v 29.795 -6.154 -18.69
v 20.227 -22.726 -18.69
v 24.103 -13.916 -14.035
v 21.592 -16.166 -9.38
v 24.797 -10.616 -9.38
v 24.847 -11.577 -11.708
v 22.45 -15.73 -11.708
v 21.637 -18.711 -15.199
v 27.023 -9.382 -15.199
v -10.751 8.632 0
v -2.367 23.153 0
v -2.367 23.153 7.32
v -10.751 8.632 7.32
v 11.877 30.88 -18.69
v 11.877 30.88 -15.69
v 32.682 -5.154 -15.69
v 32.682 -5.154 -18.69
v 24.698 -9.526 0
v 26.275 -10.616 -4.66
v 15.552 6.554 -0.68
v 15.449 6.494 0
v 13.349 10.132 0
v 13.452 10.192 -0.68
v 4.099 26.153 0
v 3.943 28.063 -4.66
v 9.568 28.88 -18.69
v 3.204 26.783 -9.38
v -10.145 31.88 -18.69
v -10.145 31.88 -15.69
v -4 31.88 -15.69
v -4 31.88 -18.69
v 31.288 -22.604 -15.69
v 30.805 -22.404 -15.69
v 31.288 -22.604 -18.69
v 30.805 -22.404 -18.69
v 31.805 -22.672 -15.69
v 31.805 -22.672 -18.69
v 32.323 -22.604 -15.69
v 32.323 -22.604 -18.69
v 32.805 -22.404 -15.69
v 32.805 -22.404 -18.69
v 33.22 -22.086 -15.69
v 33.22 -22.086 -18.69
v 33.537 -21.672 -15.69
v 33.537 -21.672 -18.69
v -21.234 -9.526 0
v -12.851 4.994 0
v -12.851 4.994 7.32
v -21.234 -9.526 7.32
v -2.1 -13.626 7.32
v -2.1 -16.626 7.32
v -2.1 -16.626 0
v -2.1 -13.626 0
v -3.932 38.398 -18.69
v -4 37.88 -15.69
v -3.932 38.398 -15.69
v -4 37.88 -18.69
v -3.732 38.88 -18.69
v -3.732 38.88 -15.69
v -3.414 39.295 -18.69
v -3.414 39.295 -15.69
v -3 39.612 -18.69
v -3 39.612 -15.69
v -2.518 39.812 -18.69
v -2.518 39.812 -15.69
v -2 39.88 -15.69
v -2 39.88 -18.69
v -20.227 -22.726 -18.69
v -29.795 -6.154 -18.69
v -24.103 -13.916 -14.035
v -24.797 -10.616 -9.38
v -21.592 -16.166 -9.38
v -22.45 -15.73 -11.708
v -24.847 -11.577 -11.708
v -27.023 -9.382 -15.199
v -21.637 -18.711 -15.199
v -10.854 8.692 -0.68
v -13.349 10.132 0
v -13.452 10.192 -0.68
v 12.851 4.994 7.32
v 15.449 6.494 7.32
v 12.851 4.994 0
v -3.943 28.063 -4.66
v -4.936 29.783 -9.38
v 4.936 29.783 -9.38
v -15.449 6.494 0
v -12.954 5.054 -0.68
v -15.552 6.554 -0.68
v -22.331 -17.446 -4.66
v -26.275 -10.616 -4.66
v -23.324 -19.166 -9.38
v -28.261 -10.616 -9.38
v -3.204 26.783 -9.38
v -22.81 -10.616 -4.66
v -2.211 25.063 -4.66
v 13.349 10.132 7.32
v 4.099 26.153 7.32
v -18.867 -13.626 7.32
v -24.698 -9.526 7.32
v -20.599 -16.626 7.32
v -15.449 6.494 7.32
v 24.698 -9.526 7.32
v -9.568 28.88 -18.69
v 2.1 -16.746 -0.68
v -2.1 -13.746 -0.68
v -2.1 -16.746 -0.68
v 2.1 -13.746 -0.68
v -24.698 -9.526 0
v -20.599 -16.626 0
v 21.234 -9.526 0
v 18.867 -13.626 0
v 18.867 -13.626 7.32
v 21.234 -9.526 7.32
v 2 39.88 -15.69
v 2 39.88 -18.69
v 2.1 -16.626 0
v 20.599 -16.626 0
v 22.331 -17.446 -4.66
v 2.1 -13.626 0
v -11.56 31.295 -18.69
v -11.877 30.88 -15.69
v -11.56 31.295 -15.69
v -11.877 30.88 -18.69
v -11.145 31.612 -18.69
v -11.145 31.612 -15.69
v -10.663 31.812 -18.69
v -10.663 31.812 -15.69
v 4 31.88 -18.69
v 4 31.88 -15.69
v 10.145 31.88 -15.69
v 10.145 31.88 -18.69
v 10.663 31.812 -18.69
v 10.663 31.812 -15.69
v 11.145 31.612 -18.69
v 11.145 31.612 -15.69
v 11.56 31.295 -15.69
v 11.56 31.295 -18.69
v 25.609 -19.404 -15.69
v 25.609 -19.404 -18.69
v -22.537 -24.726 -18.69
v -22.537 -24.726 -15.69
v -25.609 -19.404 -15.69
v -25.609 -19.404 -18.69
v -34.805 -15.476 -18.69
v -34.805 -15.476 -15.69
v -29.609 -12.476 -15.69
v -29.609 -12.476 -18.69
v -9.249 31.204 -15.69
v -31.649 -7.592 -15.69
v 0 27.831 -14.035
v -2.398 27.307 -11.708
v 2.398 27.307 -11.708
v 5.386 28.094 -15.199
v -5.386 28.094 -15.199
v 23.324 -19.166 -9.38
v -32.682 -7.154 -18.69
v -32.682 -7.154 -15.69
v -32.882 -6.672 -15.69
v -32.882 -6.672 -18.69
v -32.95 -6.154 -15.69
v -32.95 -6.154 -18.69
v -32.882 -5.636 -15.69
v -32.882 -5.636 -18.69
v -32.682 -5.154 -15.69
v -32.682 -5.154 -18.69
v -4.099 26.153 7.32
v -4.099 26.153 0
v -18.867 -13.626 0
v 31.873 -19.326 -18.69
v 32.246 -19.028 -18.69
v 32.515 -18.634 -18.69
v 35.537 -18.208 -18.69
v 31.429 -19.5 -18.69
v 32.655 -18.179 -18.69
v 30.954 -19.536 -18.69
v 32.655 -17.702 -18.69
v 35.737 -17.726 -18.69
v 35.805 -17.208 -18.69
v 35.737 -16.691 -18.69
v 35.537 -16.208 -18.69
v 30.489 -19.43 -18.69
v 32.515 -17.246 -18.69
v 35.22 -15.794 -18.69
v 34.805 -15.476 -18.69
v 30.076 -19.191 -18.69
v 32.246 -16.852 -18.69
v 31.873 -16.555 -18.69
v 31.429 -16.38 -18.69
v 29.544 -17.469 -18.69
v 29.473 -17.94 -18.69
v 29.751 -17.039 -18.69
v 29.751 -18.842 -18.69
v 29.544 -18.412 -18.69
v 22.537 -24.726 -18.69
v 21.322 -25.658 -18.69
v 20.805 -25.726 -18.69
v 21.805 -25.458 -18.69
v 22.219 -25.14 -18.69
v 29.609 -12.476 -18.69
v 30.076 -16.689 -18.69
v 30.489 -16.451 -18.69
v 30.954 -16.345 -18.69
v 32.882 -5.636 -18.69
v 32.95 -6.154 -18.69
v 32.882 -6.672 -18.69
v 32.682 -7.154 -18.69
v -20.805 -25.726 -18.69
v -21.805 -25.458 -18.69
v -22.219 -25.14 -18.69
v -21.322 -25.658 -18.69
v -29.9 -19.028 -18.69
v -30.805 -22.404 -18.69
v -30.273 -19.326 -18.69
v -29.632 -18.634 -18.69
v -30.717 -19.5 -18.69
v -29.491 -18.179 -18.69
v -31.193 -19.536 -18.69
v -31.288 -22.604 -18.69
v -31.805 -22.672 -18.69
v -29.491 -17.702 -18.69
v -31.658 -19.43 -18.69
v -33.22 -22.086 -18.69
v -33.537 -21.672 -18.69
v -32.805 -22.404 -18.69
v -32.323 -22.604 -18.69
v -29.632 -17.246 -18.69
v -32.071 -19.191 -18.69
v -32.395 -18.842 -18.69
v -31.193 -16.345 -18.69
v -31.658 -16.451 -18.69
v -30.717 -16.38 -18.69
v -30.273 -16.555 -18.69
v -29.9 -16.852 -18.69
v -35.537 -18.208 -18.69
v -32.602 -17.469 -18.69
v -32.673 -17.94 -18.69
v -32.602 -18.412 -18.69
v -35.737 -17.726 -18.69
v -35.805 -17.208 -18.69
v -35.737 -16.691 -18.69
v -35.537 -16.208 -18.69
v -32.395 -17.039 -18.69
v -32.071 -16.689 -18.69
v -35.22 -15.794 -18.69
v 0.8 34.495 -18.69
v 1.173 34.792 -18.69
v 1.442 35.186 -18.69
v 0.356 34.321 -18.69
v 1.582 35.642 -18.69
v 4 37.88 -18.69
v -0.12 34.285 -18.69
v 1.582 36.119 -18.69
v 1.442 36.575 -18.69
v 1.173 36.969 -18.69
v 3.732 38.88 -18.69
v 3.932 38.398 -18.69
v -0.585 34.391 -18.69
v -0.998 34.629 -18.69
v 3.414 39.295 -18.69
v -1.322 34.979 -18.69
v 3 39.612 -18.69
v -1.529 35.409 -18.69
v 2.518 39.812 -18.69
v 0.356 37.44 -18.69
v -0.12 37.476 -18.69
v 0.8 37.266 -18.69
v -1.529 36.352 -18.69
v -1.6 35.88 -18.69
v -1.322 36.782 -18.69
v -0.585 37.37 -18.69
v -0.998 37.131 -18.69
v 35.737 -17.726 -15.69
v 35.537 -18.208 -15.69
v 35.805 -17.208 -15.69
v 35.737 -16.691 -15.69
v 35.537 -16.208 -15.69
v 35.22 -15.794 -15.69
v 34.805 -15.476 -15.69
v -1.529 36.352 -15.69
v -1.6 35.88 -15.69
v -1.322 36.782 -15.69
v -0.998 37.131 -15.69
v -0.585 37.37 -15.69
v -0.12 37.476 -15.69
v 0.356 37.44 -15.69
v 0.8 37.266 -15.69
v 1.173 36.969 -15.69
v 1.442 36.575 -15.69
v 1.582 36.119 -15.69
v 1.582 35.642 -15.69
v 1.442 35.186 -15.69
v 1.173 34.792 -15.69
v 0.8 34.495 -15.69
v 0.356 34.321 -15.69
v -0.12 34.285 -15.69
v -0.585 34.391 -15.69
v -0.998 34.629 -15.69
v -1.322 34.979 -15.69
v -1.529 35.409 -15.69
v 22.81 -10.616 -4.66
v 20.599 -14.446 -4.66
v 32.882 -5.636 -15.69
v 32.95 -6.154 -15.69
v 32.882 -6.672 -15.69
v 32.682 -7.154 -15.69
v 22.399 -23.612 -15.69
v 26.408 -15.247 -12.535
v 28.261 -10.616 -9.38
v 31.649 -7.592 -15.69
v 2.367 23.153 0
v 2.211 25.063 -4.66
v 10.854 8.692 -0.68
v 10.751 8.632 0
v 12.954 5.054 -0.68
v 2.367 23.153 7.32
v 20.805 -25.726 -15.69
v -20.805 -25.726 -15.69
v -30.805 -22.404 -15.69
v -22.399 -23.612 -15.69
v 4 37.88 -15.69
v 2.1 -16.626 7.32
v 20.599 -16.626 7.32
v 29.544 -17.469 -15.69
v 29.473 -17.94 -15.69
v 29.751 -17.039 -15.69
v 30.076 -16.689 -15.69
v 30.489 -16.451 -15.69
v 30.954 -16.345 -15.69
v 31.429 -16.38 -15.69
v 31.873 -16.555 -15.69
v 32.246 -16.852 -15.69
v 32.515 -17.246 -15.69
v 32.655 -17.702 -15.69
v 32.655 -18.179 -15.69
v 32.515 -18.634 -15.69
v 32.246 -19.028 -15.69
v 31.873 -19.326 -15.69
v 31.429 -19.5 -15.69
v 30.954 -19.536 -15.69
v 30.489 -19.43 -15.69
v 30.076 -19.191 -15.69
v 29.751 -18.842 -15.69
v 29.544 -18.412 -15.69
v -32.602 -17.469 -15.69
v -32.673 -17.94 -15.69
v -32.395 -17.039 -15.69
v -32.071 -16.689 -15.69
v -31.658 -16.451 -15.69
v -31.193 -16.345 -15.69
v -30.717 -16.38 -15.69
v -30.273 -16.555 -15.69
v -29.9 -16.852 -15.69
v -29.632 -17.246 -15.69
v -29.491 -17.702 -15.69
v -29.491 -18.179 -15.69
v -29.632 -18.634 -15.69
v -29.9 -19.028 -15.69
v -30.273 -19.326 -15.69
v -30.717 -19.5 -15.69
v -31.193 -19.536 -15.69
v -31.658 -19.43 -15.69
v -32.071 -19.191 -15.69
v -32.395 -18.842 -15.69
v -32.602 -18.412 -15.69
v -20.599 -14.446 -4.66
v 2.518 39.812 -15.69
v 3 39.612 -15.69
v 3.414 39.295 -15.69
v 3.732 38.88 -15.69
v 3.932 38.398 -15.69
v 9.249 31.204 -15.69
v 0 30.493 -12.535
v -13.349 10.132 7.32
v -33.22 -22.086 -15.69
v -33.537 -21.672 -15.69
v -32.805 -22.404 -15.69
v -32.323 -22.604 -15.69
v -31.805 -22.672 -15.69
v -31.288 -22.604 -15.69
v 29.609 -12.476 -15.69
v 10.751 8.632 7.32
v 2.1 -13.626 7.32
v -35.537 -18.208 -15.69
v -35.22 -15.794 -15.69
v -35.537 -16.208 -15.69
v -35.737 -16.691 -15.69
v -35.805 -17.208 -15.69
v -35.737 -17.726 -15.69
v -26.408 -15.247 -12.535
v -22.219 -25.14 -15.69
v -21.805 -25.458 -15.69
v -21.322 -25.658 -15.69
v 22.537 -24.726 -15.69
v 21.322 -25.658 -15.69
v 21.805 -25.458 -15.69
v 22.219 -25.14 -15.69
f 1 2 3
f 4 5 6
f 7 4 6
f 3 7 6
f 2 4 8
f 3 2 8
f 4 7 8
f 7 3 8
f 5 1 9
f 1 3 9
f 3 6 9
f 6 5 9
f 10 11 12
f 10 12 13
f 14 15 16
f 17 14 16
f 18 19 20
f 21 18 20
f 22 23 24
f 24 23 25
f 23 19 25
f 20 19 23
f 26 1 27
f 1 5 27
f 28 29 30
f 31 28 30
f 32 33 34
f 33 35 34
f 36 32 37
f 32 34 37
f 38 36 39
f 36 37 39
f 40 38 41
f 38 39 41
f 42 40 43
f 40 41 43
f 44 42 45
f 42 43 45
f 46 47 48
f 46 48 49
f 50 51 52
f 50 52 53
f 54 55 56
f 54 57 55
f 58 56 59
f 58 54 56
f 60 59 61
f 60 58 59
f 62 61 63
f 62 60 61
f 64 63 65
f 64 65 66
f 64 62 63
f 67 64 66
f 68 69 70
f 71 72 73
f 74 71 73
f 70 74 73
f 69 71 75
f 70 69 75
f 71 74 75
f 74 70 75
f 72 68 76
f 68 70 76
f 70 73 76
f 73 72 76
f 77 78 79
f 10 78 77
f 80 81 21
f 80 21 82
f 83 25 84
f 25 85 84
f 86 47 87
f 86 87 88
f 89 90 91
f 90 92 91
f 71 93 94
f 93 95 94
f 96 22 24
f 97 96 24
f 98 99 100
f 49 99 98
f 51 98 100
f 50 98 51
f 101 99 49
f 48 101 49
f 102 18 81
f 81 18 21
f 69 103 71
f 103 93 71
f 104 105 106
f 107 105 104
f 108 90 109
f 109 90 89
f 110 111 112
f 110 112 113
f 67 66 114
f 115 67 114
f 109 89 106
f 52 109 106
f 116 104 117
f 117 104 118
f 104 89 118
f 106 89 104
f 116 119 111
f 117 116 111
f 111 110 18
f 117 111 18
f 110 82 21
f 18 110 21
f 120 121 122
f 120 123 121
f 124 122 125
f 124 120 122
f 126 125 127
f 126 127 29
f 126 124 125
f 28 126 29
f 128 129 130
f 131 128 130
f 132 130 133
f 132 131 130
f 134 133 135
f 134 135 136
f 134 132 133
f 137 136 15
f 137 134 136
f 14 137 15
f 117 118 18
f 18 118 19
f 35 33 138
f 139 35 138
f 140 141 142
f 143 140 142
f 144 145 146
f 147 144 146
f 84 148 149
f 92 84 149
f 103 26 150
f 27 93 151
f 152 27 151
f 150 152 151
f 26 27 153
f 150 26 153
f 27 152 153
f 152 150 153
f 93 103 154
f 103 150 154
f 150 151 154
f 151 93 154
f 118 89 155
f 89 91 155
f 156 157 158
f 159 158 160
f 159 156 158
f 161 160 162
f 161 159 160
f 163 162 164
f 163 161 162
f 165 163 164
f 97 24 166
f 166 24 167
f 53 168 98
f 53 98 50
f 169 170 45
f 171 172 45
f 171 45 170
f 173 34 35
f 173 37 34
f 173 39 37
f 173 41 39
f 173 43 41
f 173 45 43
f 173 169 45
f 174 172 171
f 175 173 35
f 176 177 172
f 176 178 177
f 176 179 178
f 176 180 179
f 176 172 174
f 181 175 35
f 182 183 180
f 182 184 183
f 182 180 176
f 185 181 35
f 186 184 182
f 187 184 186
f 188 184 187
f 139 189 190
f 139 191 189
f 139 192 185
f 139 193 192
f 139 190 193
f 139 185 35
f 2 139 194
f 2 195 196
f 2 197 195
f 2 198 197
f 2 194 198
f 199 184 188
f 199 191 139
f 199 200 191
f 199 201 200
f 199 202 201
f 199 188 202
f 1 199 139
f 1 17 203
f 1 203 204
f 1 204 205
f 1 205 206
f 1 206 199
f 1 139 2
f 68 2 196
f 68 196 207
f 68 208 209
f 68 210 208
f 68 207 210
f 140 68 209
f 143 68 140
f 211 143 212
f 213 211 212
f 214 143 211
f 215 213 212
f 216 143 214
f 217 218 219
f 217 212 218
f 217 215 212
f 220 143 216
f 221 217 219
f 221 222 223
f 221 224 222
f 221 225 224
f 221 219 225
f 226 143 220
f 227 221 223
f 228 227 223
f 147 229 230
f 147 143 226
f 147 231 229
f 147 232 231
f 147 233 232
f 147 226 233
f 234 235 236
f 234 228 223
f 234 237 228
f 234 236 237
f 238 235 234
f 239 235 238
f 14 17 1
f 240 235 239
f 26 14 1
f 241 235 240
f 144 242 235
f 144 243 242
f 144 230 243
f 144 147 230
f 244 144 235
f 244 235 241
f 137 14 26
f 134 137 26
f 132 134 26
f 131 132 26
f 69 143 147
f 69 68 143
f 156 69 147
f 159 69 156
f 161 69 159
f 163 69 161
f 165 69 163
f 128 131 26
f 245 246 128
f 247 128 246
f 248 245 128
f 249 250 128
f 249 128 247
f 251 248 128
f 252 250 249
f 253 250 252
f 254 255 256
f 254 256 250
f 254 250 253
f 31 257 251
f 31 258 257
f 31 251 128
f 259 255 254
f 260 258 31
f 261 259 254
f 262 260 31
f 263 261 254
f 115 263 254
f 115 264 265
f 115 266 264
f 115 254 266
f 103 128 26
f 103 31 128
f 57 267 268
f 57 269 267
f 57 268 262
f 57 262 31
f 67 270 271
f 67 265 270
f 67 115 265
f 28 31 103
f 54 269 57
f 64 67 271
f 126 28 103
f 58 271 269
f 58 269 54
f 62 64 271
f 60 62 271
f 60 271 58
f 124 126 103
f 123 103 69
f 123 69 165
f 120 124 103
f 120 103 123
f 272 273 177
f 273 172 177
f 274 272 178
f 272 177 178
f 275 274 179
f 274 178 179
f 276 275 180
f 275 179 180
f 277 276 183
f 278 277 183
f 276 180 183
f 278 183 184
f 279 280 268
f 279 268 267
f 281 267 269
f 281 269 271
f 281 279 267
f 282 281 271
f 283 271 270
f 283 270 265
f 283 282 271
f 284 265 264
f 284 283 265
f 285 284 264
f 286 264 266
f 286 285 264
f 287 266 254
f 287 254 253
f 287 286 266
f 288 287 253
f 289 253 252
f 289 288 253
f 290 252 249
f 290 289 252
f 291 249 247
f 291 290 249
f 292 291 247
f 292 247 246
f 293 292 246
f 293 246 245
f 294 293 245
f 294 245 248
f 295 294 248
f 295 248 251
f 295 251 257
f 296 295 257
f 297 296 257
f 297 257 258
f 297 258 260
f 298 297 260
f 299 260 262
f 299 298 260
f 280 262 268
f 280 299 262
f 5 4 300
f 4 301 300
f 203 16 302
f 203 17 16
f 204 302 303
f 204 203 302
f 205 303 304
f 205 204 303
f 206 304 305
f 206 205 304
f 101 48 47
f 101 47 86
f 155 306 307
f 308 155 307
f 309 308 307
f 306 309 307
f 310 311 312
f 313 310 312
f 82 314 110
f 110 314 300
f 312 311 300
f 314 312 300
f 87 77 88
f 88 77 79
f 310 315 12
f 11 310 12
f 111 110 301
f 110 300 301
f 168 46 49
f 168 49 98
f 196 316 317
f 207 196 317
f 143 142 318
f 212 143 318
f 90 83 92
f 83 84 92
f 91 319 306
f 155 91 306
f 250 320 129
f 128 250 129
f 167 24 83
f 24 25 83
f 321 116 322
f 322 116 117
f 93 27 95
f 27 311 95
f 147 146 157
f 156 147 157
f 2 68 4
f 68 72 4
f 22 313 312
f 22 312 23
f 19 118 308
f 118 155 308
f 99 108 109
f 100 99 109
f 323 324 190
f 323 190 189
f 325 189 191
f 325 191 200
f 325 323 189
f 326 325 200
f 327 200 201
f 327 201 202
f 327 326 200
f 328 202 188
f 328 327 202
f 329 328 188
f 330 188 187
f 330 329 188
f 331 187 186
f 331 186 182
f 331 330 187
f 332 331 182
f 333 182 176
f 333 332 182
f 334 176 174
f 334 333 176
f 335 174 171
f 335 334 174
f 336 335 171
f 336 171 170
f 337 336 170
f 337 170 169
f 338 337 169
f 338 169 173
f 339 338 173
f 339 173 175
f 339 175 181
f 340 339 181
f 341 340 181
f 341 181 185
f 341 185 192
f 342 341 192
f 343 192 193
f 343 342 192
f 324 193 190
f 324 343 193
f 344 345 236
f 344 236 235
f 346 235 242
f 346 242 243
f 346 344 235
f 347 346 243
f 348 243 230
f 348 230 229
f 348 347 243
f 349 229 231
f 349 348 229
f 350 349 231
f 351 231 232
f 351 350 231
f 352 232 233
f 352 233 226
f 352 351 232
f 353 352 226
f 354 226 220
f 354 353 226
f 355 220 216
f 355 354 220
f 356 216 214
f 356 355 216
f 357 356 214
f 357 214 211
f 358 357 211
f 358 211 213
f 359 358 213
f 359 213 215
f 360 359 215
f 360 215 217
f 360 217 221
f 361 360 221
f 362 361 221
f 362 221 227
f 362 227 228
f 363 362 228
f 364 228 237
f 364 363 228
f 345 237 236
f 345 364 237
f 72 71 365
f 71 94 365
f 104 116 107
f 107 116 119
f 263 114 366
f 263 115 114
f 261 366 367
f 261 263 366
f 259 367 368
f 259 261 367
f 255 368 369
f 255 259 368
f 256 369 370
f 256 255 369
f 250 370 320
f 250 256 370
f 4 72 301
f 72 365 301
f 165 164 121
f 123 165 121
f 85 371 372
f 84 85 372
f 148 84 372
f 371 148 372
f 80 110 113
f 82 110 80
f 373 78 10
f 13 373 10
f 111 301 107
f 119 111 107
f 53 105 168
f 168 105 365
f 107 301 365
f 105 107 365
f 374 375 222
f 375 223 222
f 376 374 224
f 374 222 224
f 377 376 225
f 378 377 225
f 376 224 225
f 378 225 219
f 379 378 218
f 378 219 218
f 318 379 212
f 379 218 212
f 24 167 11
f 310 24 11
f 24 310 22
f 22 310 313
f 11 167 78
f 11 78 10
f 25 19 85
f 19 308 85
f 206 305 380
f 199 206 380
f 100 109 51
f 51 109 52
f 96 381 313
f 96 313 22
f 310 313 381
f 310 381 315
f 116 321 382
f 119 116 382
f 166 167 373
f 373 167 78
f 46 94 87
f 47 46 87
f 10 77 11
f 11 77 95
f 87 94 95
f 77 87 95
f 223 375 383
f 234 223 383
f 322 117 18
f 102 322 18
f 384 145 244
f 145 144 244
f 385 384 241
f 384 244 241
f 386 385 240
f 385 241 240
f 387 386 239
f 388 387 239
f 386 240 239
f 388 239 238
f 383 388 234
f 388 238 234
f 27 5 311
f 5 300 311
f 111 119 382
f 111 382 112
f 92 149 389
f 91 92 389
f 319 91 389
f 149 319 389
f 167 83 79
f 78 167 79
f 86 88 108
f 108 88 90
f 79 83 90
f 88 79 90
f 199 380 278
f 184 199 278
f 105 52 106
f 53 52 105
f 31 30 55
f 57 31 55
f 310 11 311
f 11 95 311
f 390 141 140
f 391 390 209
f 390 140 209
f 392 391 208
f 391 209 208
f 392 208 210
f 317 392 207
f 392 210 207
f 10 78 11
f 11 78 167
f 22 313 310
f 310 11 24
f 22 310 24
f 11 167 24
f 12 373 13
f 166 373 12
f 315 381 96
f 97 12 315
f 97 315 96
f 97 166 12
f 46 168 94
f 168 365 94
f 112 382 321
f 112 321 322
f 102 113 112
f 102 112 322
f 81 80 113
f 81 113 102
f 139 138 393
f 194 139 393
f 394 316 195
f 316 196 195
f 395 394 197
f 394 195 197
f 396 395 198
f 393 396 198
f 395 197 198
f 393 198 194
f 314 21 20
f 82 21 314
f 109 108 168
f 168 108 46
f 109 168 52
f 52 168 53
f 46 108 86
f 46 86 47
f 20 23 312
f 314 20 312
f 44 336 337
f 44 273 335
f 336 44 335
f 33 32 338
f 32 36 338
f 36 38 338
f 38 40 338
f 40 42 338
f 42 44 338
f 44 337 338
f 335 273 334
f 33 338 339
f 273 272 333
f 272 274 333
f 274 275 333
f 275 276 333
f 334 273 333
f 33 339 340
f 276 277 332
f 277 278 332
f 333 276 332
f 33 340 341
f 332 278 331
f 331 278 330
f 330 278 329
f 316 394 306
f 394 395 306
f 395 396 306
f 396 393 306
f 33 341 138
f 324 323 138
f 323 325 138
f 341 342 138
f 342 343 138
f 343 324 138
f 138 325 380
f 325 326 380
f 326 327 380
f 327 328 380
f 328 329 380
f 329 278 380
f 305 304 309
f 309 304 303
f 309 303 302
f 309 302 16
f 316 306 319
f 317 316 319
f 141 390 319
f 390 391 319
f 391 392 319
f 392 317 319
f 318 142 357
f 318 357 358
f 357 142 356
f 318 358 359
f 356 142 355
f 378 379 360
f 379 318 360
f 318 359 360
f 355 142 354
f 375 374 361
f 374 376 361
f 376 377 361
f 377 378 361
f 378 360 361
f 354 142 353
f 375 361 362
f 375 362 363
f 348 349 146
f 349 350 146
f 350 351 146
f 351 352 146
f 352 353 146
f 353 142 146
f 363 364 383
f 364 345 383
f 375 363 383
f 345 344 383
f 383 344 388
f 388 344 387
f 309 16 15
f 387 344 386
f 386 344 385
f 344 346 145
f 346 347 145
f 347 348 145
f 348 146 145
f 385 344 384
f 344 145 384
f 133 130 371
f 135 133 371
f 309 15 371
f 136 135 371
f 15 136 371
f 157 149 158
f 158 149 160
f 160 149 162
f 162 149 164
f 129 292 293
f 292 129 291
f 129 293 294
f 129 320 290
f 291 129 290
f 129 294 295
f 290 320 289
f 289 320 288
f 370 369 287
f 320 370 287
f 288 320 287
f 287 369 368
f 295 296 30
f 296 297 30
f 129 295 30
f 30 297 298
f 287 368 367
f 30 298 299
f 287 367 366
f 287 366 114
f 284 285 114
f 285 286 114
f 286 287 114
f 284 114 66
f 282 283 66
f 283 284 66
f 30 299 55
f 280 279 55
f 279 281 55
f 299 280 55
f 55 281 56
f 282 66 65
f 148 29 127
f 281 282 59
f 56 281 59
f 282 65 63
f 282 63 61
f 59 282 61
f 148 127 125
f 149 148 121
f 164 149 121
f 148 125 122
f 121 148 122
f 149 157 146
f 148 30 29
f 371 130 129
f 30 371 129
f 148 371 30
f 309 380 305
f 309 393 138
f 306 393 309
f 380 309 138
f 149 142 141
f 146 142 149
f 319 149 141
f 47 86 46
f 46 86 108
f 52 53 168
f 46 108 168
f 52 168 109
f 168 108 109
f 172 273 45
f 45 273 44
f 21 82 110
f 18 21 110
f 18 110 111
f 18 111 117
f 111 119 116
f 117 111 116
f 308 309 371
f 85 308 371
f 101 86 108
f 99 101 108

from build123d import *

# Parameters (mm, degrees)
BOSS_EXTRUDE1_DEPTH     = 7.32
BOSS_EXTRUDE6_START     = -3
BOSS_EXTRUDE6_OUTLINE_R = 1.6
BOSS_EXTRUDE6_DEPTH     = 3
FILLET2_R               = 2
SKETCH16_W              = 4.2
SKETCH16_H              = 15
CUT_EXTRUDE1_DEPTH      = 8


# Read off the part's stored shape, not the designer's step: Boss-Extrude6
with BuildPart() as part:
    # Sketch1 → Boss-Extrude1 (new body)
    with BuildSketch(Plane.XY):
        Polygon((-20.599186911, -16.626279442), (20.599186911, -16.626279442), (24.698373822, -9.526279442), (4.099186911, 26.152558883), (-4.099186911, 26.152558883), (-24.698373822, -9.526279442), align=None)
        Polygon((18.867136104, -13.626279442), (21.234272207, -9.526279442), (2.367136104, 23.152558883), (-2.367136104, 23.152558883), (-21.234272207, -9.526279442), (-18.867136104, -13.626279442), align=None, mode=Mode.SUBTRACT)
    extrude(amount=BOSS_EXTRUDE1_DEPTH)


with BuildPart() as body_2:
    # Sketch1<14> → Loft3 section 0
    with BuildSketch(Plane.XY):
        with BuildLine():
            Line((-4.099186911, 26.152558883), (-24.698373822, -9.526279442))
            Line((-24.698373822, -9.526279442), (-20.599186911, -16.626279442))
            Line((-20.599186911, -16.626279442), (20.599186911, -16.626279442))
            Line((20.599186911, -16.626279442), (24.698373822, -9.526279442))
            Line((24.698373822, -9.526279442), (4.099186911, 26.152558883))
            Line((4.099186911, 26.152558883), (-4.099186911, 26.152558883))
        make_face()
    # Sketch5 → Loft3 section 1
    with BuildSketch(Plane.XY.offset(-4.66)):
        with BuildLine():
            Line((-3.943302339, 28.062558883), (-26.274540057, -10.616279442))
            Line((-26.274540057, -10.616279442), (-22.331237719, -17.446279442))
            Line((-22.331237719, -17.446279442), (22.331237719, -17.446279442))
            Line((22.331237719, -17.446279442), (26.274540057, -10.616279442))
            Line((26.274540057, -10.616279442), (3.943302339, 28.062558883))
            Line((3.943302339, 28.062558883), (-3.943302339, 28.062558883))
        make_face()
    loft()

    # Sketch5<46> → Loft4 section 0
    with BuildSketch(Plane.XY.offset(-4.66)):
        with BuildLine():
            Line((-3.943302339, 28.062558883), (-26.274540057, -10.616279442))
            Line((-26.274540057, -10.616279442), (-22.331237719, -17.446279442))
            Line((-22.331237719, -17.446279442), (22.331237719, -17.446279442))
            Line((22.331237719, -17.446279442), (26.274540057, -10.616279442))
            Line((26.274540057, -10.616279442), (3.943302339, 28.062558883))
            Line((3.943302339, 28.062558883), (-3.943302339, 28.062558883))
        make_face()
    # Sketch13 → Loft4 section 1
    with BuildSketch(Plane.XY.offset(-9.38)):
        with BuildLine():
            Line((-4.936344802, 29.782558883), (-28.260624983, -10.616279442))
            Line((-28.260624983, -10.616279442), (-23.324280182, -19.166279442))
            Line((-23.324280182, -19.166279442), (23.324280182, -19.166279442))
            Line((23.324280182, -19.166279442), (28.260624983, -10.616279442))
            Line((28.260624983, -10.616279442), (4.936344802, 29.782558883))
            Line((4.936344802, 29.782558883), (-4.936344802, 29.782558883))
        make_face()
    loft()

    # Sketch13<4> → Loft5 section 0
    with BuildSketch(Plane.XY.offset(-9.38)):
        with BuildLine():
            Line((-4.936344802, 29.782558883), (-28.260624983, -10.616279442))
            Line((-28.260624983, -10.616279442), (-23.324280182, -19.166279442))
            Line((-23.324280182, -19.166279442), (23.324280182, -19.166279442))
            Line((23.324280182, -19.166279442), (28.260624983, -10.616279442))
            Line((28.260624983, -10.616279442), (4.936344802, 29.782558883))
            Line((4.936344802, 29.782558883), (-4.936344802, 29.782558883))
        make_face()
    # Sketch14 → Loft5 section 1
    with BuildSketch(Plane.XY.offset(-18.69)):
        with BuildLine():
            Line((11.3, 31.880384758), (-11.3, 31.880384758))
            Line((-11.3, 31.880384758), (-33.259223083, -6.154105316))
            Line((-33.259223083, -6.154105316), (-21.959223083, -25.726279442))
            Line((-21.959223083, -25.726279442), (21.959223083, -25.726279442))
            Line((21.959223083, -25.726279442), (33.259223083, -6.154105316))
            Line((33.259223083, -6.154105316), (11.3, 31.880384758))
        make_face()
    loft()

    # Sketch1<15> → Cut-Loft1 section 0
    with BuildSketch(Plane.XY):
        with BuildLine():
            Line((-2.367136104, 23.152558883), (2.367136104, 23.152558883))
            Line((2.367136104, 23.152558883), (21.234272207, -9.526279442))
            Line((21.234272207, -9.526279442), (18.867136104, -13.626279442))
            Line((18.867136104, -13.626279442), (-18.867136104, -13.626279442))
            Line((-18.867136104, -13.626279442), (-21.234272207, -9.526279442))
            Line((-21.234272207, -9.526279442), (-2.367136104, 23.152558883))
        make_face()
    # Sketch5<47> → Cut-Loft1 section 1
    with BuildSketch(Plane.XY.offset(-4.66)):
        with BuildLine():
            Line((2.211251531, 25.062558883), (22.810438442, -10.616279442))
            Line((22.810438442, -10.616279442), (20.599186911, -14.446279442))
            Line((20.599186911, -14.446279442), (-20.599186911, -14.446279442))
            Line((-20.599186911, -14.446279442), (-22.810438442, -10.616279442))
            Line((-22.810438442, -10.616279442), (-2.211251531, 25.062558883))
            Line((-2.211251531, 25.062558883), (2.211251531, 25.062558883))
        make_face()
    loft(mode=Mode.SUBTRACT)

    # Sketch14<5> → Cut-Loft2 section 0
    with BuildSketch(Plane.XY.offset(-18.69)):
        with BuildLine():
            Line((29.795121467, -6.154105316), (9.567949192, 28.880384758))
            Line((9.567949192, 28.880384758), (-9.567949192, 28.880384758))
            Line((-9.567949192, 28.880384758), (-29.795121467, -6.154105316))
            Line((-29.795121467, -6.154105316), (-20.227172275, -22.726279442))
            Line((-20.227172275, -22.726279442), (20.227172275, -22.726279442))
            Line((20.227172275, -22.726279442), (29.795121467, -6.154105316))
        make_face()
    # Sketch13<5> → Cut-Loft2 section 1
    with BuildSketch(Plane.XY.offset(-9.38)):
        with BuildLine():
            Line((-24.796523368, -10.616279442), (-21.592229374, -16.166279442))
            Line((-21.592229374, -16.166279442), (21.592229374, -16.166279442))
            Line((21.592229374, -16.166279442), (24.796523368, -10.616279442))
            Line((24.796523368, -10.616279442), (3.204293994, 26.782558883))
            Line((3.204293994, 26.782558883), (-3.204293994, 26.782558883))
            Line((-3.204293994, 26.782558883), (-24.796523368, -10.616279442))
        make_face()
    loft(mode=Mode.SUBTRACT)

    # Sketch13<6> → Cut-Loft3 section 0
    with BuildSketch(Plane.XY.offset(-9.38)):
        with BuildLine():
            Line((-24.796523368, -10.616279442), (-21.592229374, -16.166279442))
            Line((-21.592229374, -16.166279442), (21.592229374, -16.166279442))
            Line((21.592229374, -16.166279442), (24.796523368, -10.616279442))
            Line((24.796523368, -10.616279442), (3.204293994, 26.782558883))
            Line((3.204293994, 26.782558883), (-3.204293994, 26.782558883))
            Line((-3.204293994, 26.782558883), (-24.796523368, -10.616279442))
        make_face()
    # Sketch5<48> → Cut-Loft3 section 1
    with BuildSketch(Plane.XY.offset(-4.66)):
        with BuildLine():
            Line((2.211251531, 25.062558883), (22.810438442, -10.616279442))
            Line((22.810438442, -10.616279442), (20.599186911, -14.446279442))
            Line((20.599186911, -14.446279442), (-20.599186911, -14.446279442))
            Line((-20.599186911, -14.446279442), (-22.810438442, -10.616279442))
            Line((-22.810438442, -10.616279442), (-2.211251531, 25.062558883))
            Line((-2.211251531, 25.062558883), (2.211251531, 25.062558883))
        make_face()
    loft(mode=Mode.SUBTRACT)

    # Boss-Extrude6 outline → Boss-Extrude6 (add)
    with BuildSketch(Plane(origin=(0, 0, -18.69), x_dir=(-1, 0, 0), z_dir=(0, 0, -1)).offset(BOSS_EXTRUDE6_START)):
        Polygon((36.537426313, -16.476090764), (29.609223083, -12.476090764), (33.259223083, -6.154105316), (11.3, 31.880384758), (4, 31.880384758), (4, 39.880384758), (-4, 39.880384758), (-4, 31.880384758), (-11.3, 31.880384758), (-33.259223083, -6.154105316), (-29.609223083, -12.476090764), (-36.537426313, -16.476090764), (-32.537426313, -23.404293994), (-25.609223083, -19.404293994), (-21.959223083, -25.726279442), (21.959223083, -25.726279442), (25.609223083, -19.404293994), (32.537426313, -23.404293994), align=None)
        with Locations((31.073324698, -17.940192379)):
            Circle(BOSS_EXTRUDE6_OUTLINE_R, mode=Mode.SUBTRACT)
        Polygon((-29.795121467, -6.154105316), (-9.567949192, 28.880384758), (9.567949192, 28.880384758), (29.795121467, -6.154105316), (20.227172275, -22.726279442), (-20.227172275, -22.726279442), align=None, mode=Mode.SUBTRACT)
        with Locations((-31.073324698, -17.940192379)):
            Circle(BOSS_EXTRUDE6_OUTLINE_R, mode=Mode.SUBTRACT)
        with Locations((0, 35.880384758)):
            Circle(BOSS_EXTRUDE6_OUTLINE_R, mode=Mode.SUBTRACT)
    extrude(amount=BOSS_EXTRUDE6_DEPTH)

    # Fillet2
    fillet2_edges = [body_2.edges().sort_by_distance(p)[0] for p in [
        (-11.3, 31.880384758, -17.19),
        (-33.259223083, -6.154105316, -17.19),
        (-36.537426313, -16.476090764, -17.19),
        (-32.537426313, -23.404293994, -17.19),
        (-21.959223083, -25.726279442, -17.19),
        (21.959223083, -25.726279442, -17.19),
        (32.537426313, -23.404293994, -17.19),
        (36.537426313, -16.476090764, -17.19),
        (33.259223083, -6.154105316, -17.19),
        (11.3, 31.880384758, -17.19),
        (4, 39.880384758, -17.19),
        (-4, 39.880384758, -17.19),
    ]]
    fillet(fillet2_edges, radius=FILLET2_R)


with BuildPart() as cut_extrude1_tool:
    # Sketch16 → Cut-Extrude1 (new body)
    with BuildSketch(Plane.XY.offset(7.32)):
        with Locations((0, -21.126279442)):
            Rectangle(SKETCH16_W, SKETCH16_H)
        Polygon((-12.850704156, 4.994486373), (-25.841085212, 12.494486373), (-23.741085212, 16.131793069), (-10.750704156, 8.631793069), align=None)
        Polygon((10.750704156, 8.631793069), (23.741085212, 16.131793069), (25.841085212, 12.494486373), (12.850704156, 4.994486373), align=None)
    extrude(amount=-CUT_EXTRUDE1_DEPTH)


with BuildPart() as part_1:
    add(part.part)

    # Cut-Extrude1: cut by cut_extrude1_tool
    add(cut_extrude1_tool.part, mode=Mode.SUBTRACT)


with BuildPart() as body_2_1:
    add(body_2.part)

    # Cut-Extrude1: cut by cut_extrude1_tool
    add(cut_extrude1_tool.part, mode=Mode.SUBTRACT)


solid = Compound([part_1.part, body_2_1.part])
